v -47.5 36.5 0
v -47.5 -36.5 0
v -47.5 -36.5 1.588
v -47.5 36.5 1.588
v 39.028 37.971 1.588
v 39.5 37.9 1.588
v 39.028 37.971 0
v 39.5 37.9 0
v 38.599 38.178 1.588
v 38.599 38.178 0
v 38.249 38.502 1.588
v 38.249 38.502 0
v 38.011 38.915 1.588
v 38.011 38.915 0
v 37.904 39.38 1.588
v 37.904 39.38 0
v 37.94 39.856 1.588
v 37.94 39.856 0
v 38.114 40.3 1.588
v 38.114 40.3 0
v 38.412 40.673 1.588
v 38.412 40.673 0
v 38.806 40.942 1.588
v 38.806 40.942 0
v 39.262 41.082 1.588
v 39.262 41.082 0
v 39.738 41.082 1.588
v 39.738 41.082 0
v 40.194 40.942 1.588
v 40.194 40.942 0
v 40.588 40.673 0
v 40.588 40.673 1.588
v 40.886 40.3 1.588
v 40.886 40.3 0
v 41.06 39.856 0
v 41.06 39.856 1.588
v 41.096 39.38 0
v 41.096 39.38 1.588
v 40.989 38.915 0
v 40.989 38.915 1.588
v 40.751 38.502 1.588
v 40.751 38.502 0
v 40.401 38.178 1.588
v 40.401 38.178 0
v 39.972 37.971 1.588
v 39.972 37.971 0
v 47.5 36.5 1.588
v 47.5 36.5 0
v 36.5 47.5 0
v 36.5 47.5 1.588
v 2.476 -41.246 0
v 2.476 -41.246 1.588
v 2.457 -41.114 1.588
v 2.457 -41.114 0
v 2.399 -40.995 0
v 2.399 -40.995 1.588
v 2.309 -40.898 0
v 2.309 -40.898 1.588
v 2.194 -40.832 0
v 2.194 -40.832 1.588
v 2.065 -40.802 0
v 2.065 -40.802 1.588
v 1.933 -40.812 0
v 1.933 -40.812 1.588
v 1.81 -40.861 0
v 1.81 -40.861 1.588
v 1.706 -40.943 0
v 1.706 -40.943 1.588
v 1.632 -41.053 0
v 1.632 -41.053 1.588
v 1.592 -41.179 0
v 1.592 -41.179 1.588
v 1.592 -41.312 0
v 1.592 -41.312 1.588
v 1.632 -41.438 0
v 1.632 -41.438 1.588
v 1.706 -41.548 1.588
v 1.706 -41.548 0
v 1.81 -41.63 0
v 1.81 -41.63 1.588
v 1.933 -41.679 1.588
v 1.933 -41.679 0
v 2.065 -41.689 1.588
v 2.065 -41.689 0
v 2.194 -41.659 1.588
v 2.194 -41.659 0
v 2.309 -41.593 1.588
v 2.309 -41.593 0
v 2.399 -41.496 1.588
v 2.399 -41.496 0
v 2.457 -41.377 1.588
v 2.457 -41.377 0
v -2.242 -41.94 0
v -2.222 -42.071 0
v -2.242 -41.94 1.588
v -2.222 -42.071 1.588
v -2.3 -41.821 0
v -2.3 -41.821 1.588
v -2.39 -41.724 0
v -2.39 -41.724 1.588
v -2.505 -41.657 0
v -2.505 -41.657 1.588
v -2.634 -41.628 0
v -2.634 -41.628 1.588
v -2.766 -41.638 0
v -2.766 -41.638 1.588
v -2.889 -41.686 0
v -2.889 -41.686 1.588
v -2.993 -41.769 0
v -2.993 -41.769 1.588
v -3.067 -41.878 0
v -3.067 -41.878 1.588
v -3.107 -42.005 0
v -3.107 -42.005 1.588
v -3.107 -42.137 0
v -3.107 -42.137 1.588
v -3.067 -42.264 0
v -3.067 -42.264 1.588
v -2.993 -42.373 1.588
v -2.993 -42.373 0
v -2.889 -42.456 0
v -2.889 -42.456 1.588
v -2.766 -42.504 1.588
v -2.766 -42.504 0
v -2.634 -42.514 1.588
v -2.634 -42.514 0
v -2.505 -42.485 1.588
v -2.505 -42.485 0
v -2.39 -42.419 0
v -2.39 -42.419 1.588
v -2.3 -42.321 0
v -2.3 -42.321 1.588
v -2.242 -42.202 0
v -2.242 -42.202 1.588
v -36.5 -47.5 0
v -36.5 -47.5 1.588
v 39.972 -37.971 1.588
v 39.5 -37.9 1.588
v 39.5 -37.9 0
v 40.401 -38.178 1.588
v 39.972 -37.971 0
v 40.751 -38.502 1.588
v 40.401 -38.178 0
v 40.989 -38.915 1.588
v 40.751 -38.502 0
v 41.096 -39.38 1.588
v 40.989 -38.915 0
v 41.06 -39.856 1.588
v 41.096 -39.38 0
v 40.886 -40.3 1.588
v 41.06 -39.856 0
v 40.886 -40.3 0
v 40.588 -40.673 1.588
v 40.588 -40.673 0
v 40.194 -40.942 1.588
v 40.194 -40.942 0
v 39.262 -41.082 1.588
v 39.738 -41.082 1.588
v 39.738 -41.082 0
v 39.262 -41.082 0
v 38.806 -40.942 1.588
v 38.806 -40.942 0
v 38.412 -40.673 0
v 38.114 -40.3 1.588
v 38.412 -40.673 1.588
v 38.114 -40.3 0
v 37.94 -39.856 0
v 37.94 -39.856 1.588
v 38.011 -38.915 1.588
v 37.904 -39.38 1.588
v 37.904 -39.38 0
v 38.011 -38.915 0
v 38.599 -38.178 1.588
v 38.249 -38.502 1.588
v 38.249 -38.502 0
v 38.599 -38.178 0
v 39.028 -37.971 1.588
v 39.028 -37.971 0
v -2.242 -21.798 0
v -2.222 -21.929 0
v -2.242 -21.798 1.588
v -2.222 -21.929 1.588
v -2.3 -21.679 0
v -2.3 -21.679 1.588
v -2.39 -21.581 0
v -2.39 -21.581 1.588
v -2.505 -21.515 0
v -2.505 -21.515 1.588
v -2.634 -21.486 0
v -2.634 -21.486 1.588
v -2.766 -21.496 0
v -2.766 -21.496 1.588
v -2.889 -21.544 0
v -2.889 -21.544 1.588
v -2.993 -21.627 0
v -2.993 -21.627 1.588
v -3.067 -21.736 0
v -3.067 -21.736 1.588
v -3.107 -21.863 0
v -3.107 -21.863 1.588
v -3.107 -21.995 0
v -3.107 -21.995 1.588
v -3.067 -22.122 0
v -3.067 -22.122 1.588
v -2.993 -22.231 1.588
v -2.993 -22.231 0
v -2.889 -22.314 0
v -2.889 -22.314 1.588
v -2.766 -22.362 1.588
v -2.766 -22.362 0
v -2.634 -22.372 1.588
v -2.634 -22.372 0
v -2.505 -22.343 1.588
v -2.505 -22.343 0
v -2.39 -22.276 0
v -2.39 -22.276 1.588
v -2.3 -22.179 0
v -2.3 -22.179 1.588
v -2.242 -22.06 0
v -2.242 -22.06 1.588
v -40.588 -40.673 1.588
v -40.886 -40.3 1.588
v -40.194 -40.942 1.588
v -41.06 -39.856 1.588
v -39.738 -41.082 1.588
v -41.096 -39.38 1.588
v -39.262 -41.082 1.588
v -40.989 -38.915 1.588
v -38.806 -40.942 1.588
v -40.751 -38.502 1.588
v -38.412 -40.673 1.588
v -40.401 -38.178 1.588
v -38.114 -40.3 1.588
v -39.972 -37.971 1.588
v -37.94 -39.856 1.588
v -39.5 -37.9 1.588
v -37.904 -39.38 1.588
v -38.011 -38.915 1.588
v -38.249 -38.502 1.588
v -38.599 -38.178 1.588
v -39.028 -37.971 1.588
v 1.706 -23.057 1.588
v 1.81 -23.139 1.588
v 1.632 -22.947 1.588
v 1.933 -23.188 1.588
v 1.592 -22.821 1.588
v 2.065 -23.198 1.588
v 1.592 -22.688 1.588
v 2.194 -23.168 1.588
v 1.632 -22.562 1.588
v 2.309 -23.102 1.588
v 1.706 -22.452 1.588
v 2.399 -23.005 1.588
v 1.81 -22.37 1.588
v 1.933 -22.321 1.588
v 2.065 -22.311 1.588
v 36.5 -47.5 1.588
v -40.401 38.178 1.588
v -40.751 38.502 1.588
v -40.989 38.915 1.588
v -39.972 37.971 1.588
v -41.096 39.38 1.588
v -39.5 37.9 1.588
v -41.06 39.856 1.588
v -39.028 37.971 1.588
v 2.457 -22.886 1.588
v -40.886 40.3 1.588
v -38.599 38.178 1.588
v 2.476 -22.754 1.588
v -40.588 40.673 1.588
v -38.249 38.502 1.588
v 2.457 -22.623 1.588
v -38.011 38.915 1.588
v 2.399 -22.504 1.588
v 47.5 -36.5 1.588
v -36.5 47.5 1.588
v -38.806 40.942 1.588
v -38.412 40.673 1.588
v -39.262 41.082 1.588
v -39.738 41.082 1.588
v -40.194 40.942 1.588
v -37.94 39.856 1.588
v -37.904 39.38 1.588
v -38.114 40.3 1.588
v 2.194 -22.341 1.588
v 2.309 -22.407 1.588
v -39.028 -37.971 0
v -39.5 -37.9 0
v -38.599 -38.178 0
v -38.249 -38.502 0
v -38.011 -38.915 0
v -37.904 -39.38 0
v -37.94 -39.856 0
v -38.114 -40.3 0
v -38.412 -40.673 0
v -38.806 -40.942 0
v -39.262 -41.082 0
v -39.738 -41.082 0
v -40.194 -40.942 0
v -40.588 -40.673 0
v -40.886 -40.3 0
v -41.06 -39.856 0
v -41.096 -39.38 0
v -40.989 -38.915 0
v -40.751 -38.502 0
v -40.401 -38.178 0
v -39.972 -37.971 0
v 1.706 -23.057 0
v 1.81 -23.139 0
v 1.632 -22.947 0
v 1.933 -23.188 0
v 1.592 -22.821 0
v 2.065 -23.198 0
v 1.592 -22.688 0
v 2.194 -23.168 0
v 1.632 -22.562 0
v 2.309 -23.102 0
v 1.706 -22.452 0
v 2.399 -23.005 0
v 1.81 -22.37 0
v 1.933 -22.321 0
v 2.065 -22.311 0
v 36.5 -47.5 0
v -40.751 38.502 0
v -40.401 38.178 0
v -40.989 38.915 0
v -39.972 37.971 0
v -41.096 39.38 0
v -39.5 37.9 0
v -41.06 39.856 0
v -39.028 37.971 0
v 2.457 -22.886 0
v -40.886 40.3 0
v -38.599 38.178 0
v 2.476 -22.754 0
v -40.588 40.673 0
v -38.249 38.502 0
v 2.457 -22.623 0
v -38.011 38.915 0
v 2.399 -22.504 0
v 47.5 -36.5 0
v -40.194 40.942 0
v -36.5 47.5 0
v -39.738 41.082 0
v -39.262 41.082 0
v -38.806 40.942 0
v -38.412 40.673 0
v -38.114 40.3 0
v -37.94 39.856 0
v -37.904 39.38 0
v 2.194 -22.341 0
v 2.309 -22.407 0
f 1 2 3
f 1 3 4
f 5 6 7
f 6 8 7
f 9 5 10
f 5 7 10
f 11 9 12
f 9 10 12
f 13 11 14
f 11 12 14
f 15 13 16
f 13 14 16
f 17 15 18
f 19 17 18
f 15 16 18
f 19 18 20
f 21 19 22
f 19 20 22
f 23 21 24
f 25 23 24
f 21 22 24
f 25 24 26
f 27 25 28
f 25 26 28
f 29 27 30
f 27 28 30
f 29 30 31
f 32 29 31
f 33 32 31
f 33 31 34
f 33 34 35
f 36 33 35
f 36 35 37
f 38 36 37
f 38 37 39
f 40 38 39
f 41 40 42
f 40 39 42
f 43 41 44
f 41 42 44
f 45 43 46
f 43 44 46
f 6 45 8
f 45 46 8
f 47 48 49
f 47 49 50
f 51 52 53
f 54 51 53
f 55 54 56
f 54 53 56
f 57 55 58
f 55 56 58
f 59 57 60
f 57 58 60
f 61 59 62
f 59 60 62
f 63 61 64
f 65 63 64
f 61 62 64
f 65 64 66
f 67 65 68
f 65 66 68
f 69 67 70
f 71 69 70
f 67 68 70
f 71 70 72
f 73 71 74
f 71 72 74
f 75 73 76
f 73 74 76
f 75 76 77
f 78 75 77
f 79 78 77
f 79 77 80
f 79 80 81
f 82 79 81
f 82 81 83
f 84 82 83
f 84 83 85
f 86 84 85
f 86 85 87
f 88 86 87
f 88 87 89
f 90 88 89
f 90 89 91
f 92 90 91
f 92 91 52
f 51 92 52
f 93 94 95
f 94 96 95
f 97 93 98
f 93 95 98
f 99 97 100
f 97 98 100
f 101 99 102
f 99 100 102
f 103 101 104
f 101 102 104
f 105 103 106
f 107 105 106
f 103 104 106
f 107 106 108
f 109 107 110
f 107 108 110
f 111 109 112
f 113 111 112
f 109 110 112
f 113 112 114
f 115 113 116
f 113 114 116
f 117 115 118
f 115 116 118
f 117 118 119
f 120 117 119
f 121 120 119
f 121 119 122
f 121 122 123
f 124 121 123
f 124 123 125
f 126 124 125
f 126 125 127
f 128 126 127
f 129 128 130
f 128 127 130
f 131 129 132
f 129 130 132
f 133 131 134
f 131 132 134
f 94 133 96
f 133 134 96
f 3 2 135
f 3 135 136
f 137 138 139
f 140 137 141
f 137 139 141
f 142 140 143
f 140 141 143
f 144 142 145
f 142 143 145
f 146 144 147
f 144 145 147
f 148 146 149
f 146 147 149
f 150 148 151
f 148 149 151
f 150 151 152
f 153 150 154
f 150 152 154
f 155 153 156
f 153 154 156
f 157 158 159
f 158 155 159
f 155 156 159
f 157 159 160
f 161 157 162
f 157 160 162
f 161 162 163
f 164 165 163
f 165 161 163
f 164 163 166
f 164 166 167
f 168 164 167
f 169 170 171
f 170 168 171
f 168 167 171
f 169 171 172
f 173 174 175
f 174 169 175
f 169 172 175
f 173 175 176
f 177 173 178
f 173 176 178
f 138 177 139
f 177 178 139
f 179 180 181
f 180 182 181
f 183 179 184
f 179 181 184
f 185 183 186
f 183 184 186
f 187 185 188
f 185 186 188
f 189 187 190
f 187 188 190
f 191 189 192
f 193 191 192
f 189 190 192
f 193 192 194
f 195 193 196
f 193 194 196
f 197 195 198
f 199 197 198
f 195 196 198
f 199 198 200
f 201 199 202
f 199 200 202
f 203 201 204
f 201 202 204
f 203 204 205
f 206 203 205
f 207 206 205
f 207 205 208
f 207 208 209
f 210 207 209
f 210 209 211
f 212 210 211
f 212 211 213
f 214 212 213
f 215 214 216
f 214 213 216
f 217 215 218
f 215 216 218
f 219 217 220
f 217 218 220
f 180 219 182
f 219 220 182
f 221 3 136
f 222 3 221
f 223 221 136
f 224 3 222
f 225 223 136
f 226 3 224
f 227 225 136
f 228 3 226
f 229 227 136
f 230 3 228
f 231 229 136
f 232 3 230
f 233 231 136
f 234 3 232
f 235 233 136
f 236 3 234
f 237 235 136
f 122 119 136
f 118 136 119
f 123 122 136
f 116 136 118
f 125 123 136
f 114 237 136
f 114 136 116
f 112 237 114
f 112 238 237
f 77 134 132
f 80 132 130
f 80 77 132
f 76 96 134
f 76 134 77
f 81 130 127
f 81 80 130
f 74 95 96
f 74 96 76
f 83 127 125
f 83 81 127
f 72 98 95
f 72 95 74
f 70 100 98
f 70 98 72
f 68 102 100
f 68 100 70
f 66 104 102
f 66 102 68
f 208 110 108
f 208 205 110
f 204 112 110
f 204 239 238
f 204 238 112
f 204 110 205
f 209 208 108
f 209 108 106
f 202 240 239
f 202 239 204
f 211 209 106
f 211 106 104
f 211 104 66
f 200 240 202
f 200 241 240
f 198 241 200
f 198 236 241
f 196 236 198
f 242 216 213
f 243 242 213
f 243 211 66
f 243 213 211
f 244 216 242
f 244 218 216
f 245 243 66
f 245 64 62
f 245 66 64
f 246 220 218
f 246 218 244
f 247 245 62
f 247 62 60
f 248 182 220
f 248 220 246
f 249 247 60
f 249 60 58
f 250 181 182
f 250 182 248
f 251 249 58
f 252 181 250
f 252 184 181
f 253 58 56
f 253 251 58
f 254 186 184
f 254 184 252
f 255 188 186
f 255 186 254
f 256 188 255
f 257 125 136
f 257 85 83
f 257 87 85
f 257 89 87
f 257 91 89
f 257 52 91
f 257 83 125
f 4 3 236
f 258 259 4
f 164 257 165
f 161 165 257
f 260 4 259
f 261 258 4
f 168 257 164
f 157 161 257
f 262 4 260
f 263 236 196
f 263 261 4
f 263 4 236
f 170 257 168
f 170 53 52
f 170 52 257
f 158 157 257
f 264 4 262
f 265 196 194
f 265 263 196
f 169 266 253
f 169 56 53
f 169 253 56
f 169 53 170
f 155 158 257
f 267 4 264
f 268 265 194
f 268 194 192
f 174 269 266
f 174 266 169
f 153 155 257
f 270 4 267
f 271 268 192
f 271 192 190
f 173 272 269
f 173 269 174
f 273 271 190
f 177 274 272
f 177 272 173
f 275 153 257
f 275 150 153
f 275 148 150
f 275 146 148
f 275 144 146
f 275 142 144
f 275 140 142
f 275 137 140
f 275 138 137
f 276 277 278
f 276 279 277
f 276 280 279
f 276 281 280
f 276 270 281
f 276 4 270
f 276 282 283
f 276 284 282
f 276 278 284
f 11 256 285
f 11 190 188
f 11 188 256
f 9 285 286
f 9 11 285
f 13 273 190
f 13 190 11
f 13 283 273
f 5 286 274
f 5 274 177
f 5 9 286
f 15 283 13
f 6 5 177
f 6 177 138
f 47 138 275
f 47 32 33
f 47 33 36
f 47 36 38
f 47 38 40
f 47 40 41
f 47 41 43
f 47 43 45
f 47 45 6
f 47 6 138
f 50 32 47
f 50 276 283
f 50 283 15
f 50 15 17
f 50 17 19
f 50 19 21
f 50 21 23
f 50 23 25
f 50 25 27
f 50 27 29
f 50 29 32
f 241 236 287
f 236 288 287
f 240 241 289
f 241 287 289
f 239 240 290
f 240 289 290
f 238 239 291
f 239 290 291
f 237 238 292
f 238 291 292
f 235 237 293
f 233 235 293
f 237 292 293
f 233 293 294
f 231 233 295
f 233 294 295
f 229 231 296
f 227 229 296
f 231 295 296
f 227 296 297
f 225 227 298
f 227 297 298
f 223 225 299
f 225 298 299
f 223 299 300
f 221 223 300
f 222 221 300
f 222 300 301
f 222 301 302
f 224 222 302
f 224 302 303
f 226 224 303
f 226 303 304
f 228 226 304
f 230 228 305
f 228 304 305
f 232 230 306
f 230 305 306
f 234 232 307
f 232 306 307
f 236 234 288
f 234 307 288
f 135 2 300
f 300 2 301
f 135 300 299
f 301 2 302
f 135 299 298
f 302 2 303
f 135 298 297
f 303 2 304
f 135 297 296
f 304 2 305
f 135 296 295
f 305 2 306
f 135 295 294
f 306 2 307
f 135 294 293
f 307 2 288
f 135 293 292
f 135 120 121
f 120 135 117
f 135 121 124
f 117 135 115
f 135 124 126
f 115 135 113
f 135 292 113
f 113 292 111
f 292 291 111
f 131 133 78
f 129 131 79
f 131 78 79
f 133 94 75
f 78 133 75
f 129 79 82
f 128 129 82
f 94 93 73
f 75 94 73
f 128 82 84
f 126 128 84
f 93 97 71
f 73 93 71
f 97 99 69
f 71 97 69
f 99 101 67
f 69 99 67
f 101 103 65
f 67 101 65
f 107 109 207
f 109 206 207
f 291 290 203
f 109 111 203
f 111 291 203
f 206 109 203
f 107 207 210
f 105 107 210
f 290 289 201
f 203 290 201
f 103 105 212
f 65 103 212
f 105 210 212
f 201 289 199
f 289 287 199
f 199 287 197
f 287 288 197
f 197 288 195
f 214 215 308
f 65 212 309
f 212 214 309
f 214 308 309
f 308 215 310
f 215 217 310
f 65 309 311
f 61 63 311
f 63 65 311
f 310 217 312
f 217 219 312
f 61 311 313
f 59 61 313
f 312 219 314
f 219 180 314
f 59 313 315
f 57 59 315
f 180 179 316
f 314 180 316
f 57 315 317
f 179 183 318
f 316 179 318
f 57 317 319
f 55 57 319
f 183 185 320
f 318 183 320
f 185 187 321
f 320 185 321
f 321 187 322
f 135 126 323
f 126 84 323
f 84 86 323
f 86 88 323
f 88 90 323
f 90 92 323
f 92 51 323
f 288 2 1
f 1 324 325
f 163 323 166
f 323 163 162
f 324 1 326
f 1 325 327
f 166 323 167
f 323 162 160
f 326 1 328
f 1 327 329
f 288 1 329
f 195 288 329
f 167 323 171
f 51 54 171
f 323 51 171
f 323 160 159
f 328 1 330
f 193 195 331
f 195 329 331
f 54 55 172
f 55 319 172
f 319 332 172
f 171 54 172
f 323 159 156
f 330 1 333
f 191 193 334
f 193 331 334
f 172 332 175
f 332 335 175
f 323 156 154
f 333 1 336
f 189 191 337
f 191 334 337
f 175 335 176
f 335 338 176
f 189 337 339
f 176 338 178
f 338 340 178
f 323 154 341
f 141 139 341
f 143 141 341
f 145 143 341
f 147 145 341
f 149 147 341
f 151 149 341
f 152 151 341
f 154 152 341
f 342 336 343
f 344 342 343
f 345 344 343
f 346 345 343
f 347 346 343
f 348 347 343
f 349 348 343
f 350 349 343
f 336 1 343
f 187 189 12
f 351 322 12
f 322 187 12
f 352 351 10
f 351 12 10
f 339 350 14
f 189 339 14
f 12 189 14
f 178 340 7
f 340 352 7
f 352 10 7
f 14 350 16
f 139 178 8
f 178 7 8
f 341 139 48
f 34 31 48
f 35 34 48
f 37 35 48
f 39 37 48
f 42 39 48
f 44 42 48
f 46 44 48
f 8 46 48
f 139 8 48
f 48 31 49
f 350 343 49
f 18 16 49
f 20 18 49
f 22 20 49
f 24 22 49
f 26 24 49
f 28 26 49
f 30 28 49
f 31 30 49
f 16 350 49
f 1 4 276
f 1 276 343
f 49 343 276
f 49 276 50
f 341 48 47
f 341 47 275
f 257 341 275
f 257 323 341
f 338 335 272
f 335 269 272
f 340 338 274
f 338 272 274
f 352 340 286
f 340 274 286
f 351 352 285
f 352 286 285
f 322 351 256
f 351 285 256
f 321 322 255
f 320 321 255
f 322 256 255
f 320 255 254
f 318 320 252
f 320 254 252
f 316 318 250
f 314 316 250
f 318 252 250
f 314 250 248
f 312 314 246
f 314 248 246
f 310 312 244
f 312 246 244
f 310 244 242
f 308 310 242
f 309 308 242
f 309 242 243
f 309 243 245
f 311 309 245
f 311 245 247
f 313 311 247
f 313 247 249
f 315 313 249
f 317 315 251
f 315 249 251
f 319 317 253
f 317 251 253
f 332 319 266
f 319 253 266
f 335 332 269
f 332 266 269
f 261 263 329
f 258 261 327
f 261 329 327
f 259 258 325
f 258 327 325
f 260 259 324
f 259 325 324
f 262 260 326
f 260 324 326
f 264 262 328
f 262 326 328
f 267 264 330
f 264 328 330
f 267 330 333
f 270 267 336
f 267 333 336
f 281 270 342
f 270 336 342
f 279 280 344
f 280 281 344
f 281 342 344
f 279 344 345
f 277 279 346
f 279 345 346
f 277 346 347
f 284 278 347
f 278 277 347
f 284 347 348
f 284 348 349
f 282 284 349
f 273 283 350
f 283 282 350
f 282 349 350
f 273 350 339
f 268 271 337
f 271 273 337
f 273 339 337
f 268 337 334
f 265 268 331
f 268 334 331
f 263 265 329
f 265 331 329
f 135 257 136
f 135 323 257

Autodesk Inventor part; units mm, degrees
sketch "AL_spacer_contact_Zminus" plane through (0, 0, 0) normal (0, 0, 1) x (1, 0, 0)
  circle A0 centre (39.5, 39.5) radius 3.175
  circle A1 centre (39.5, -39.5) radius 3.175
  circle A2 centre (-39.5, -39.5) radius 3.175
  circle A3 centre (-39.5, 39.5) radius 3.175
  point P0 (0, 0)
  dimension "d228" = 39.5
  dimension "d229" = 39.5
  dimension "d230" = 39.5
  dimension "d231" = 39.5
  dimension "d232" = 39.5
  dimension "d233" = 39.5
  dimension "d234" = 39.5
  dimension "d235" = 39.5
  dimension "d236" = 6.35
sketch "Delrin_stayout_Zminus" plane through (0, 0, 0) normal (0, 0, 1) x (1, 0, 0)
  line L0 (47.5, 39.5) -> (47.5, 31)
  line L1 (47.5, 31) -> (39.5, 31)
  line L2 (39.5, 31) -> (31, 39.5)
  line L3 (31, 39.5) -> (31, 47.5)
  line L4 (31, 47.5) -> (39.5, 47.5)
  line L5 (39.5, 47.5) -> (47.5, 39.5)
  line L6 (-39.5, 47.5) -> (-47.5, 39.5)
  line L7 (-47.5, 39.5) -> (-47.5, 31)
  line L8 (-47.5, 31) -> (-39.5, 31)
  line L9 (-39.5, 31) -> (-31, 39.5)
  line L10 (-31, 39.5) -> (-31, 47.5)
  line L11 (-31, 47.5) -> (-39.5, 47.5)
  line L12 (47.5, -39.5) -> (39.5, -47.5)
  line L13 (39.5, -47.5) -> (31, -47.5)
  line L14 (31, -47.5) -> (31, -39.5)
  line L15 (31, -39.5) -> (39.5, -31)
  line L16 (39.5, -31) -> (47.5, -31)
  line L17 (47.5, -31) -> (47.5, -39.5)
  line L18 (-39.5, -47.5) -> (-47.5, -39.5)
  line L19 (-47.5, -39.5) -> (-47.5, -31)
  line L20 (-47.5, -31) -> (-39.5, -31)
  line L21 (-39.5, -31) -> (-31, -39.5)
  line L22 (-31, -39.5) -> (-31, -47.5)
  line L23 (-31, -47.5) -> (-39.5, -47.5)
  point P0 (0, 0)
  dimension "d243" = 16.5
  dimension "d244" = 8
  dimension "d245" = 8.5
  dimension "d246" = 16.5
  dimension "d247" = 47.5
  dimension "d248" = 47.5
  dimension "d249" = 47.5
  dimension "d250" = 47.5
  dimension "d251" = 47.5
  dimension "d252" = 47.5
  dimension "d253" = 47.5
  dimension "d254" = 47.5
sketch "Nub_stayout_Zminus" plane through (0, 0, 0) normal (0, 0, 1) x (1, 0, 0)
  line L0 (29, 47.5) -> (39.5, 47.5)
  line L1 (39.5, 47.5) -> (47.5, 39.5)
  line L2 (47.5, 39.5) -> (47.5, 29)
  line L3 (47.5, 29) -> (42, 29)
  line L4 (42, 29) -> (42, 40.4125)
  line L5 (40.4125, 42) -> (29, 42)
  line L6 (29, 42) -> (29, 47.5)
  arc A0 (42, 40.4125) -> (40.4125, 42) centre (40.4125, 40.4125) ccw
  line L7 (-29, 47.5) -> (-39.5, 47.5)
  line L8 (-39.5, 47.5) -> (-47.5, 39.5)
  line L9 (-47.5, 39.5) -> (-47.5, 29)
  line L10 (-47.5, 29) -> (-42, 29)
  line L11 (-42, 29) -> (-42, 40.4125)
  line L12 (-40.4125, 42) -> (-29, 42)
  line L13 (-29, 42) -> (-29, 47.5)
  arc A1 (-40.4125, 42) -> (-42, 40.4125) centre (-40.4125, 40.4125) ccw
  line L14 (-47.5, -29) -> (-42, -29)
  line L15 (-42, -29) -> (-42, -40.4125)
  line L16 (-40.4125, -42) -> (-29, -42)
  line L17 (-29, -42) -> (-29, -47.5)
  line L18 (-29, -47.5) -> (-39.5, -47.5)
  line L19 (-39.5, -47.5) -> (-47.5, -39.5)
  line L20 (-47.5, -39.5) -> (-47.5, -29)
  arc A2 (-42, -40.4125) -> (-40.4125, -42) centre (-40.4125, -40.4125) ccw
  line L21 (47.5, -29) -> (42, -29)
  line L22 (42, -29) -> (42, -40.4125)
  line L23 (40.4125, -42) -> (29, -42)
  line L24 (29, -42) -> (29, -47.5)
  line L25 (29, -47.5) -> (39.5, -47.5)
  line L26 (39.5, -47.5) -> (47.5, -39.5)
  line L27 (47.5, -39.5) -> (47.5, -29)
  arc A3 (40.4125, -42) -> (42, -40.4125) centre (40.4125, -40.4125) ccw
  point P0 (0, 0)
  dimension "d255" = 1.5875
  dimension "d256" = 18.5
  dimension "d257" = 8
  dimension "d258" = 5.5
  dimension "d259" = 47.5
  dimension "d260" = 47.5
  dimension "d264" = 1.5875
  dimension "d265" = 47.5
  dimension "d266" = 47.5
  dimension "d267" = 1.5875
  dimension "d268" = 47.5
  dimension "d269" = 47.5
  dimension "d270" = 1.5875
  dimension "d271" = 47.5
  dimension "d272" = 47.5
ref_plane "Zplus_face" through (0, 0, 1.5875) normal (0, 0, 1) x (1, 0, 0)
sketch "AL_spacer_contact_Zplus" plane through (0, 0, 1.5875) normal (0, 0, 1) x (1, 0, 0)
  circle A0 centre (-39.5, 39.5) radius 3.175
  circle A1 centre (-39.5, -39.5) radius 3.175
  circle A2 centre (39.5, -39.5) radius 3.175
  circle A3 centre (39.5, 39.5) radius 3.175
  point P0 (0, 0)
  dimension "d129" = 39.5
  dimension "d130" = 39.5
  dimension "d131" = 39.5
  dimension "d132" = 39.5
  dimension "d133" = 6.35
sketch "Delrin_stayout_Zplus" plane through (0, 0, 1.5875) normal (0, 0, 1) x (1, 0, 0)
  line L0 (47.5, -31) -> (47.5, -39.5)
  line L1 (47.5, -39.5) -> (39.5, -47.5)
  line L2 (39.5, -47.5) -> (31, -47.5)
  line L3 (31, -47.5) -> (31, -39.5)
  line L4 (31, -39.5) -> (39.5, -31)
  line L5 (39.5, -31) -> (47.5, -31)
  line L6 (47.5, 31) -> (47.5, 39.5)
  line L7 (47.5, 39.5) -> (39.5, 47.5)
  line L8 (39.5, 47.5) -> (31, 47.5)
  line L9 (31, 47.5) -> (31, 39.5)
  line L10 (31, 39.5) -> (39.5, 31)
  line L11 (39.5, 31) -> (47.5, 31)
  line L12 (-39.5, 47.5) -> (-47.5, 39.5)
  line L13 (-47.5, 39.5) -> (-47.5, 31)
  line L14 (-47.5, 31) -> (-39.5, 31)
  line L15 (-39.5, 31) -> (-31, 39.5)
  line L16 (-31, 39.5) -> (-31, 47.5)
  line L17 (-31, 47.5) -> (-39.5, 47.5)
  line L18 (-47.5, -39.5) -> (-39.5, -47.5)
  line L19 (-39.5, -47.5) -> (-31, -47.5)
  line L20 (-31, -47.5) -> (-31, -39.5)
  line L21 (-31, -39.5) -> (-39.5, -31)
  line L22 (-39.5, -31) -> (-47.5, -31)
  line L23 (-47.5, -31) -> (-47.5, -39.5)
  point P0 (0, 0)
  dimension "d115" = 16.5
  dimension "d116" = 16.5
  dimension "d117" = 8
  dimension "d118" = 8.5
  dimension "d121" = 47.5
  dimension "d122" = 47.5
  dimension "d123" = 47.5
  dimension "d124" = 47.5
  dimension "d125" = 47.5
  dimension "d126" = 47.5
  dimension "d127" = 47.5
  dimension "d128" = 47.5
sketch "Nub_stayout_Zplus" plane through (0, 0, 1.5875) normal (0, 0, 1) x (1, 0, 0)
  line L0 (47.5, 29) -> (42, 29)
  line L1 (42, 29) -> (42, 40.4125)
  line L2 (40.4125, 42) -> (29, 42)
  line L3 (29, 42) -> (29, 47.5)
  arc A0 (42, 40.4125) -> (40.4125, 42) centre (40.4125, 40.4125) ccw
  line L4 (29, 47.5) -> (39.5, 47.5)
  line L5 (39.5, 47.5) -> (47.5, 39.5)
  line L6 (47.5, 39.5) -> (47.5, 29)
  line L7 (-39.5, 47.5) -> (-29, 47.5)
  line L8 (-29, 47.5) -> (-29, 42)
  line L9 (-29, 42) -> (-40.4125, 42)
  line L10 (-42, 40.4125) -> (-42, 29)
  line L11 (-42, 29) -> (-47.5, 29)
  line L12 (-47.5, 29) -> (-47.5, 39.5)
  line L13 (-47.5, 39.5) -> (-39.5, 47.5)
  arc A1 (-40.4125, 42) -> (-42, 40.4125) centre (-40.4125, 40.4125) ccw
  line L14 (-47.5, -29) -> (-47.5, -39.5)
  line L15 (-47.5, -39.5) -> (-39.5, -47.5)
  line L16 (-39.5, -47.5) -> (-29, -47.5)
  line L17 (-29, -47.5) -> (-29, -42)
  line L18 (-29, -42) -> (-40.4125, -42)
  line L19 (-42, -40.4125) -> (-42, -29)
  line L20 (-42, -29) -> (-47.5, -29)
  arc A2 (-42, -40.4125) -> (-40.4125, -42) centre (-40.4125, -40.4125) ccw
  line L21 (29, -47.5) -> (39.5, -47.5)
  line L22 (39.5, -47.5) -> (47.5, -39.5)
  line L23 (47.5, -39.5) -> (47.5, -29)
  line L24 (47.5, -29) -> (42, -29)
  line L25 (42, -29) -> (42, -40.4125)
  line L26 (40.4125, -42) -> (29, -42)
  line L27 (29, -42) -> (29, -47.5)
  arc A3 (40.4125, -42) -> (42, -40.4125) centre (40.4125, -40.4125) ccw
  point P0 (0, 0)
  dimension "d116" = 16.5
  dimension "d146" = 1.5875
  dimension "d147" = 5.5
  dimension "d149" = 18.5
  dimension "d150" = 8
  dimension "d151" = 47.5
  dimension "d152" = 47.5
  dimension "d153" = 1.5875
  dimension "d154" = 47.5
  dimension "d155" = 47.5
  dimension "d156" = 1.5875
  dimension "d157" = 47.5
  dimension "d158" = 47.5
  dimension "d159" = 1.5875
  dimension "d160" = 47.5
  dimension "d161" = 47.5
sketch "Sketch1" plane through (0, 0, 0) normal (0, 0, 1) x (1, 0, 0)
  line L0 (-47.5, 47.5) -> (47.5, 47.5)
  line L1 (47.5, 47.5) -> (47.5, -47.5)
  line L2 (47.5, -47.5) -> (-47.5, -47.5)
  line L3 (-47.5, -47.5) -> (-47.5, 47.5)
  point P0 (0, 0)
  dimension "d0" = 95
  dimension "d1" = 95
  dimension "d2" = 47.5
  dimension "d3" = 47.5
extrude "Extrusion1" add sketch "Sketch1" along normal blind 1.5875
chamfer "Chamfer2" distance 11 angle 45 4 edges at (-47.5, -47.5, 0.7937) (47.5, -47.5, 0.7937) (47.5, 47.5, 0.7937) (-47.5, 47.5, 0.7937)
ref_plane "Work Plane_ConnX" through (-32, 0, 0) normal (1, 0, 0) x (0, 1, 0)
ref_plane "Work Plane_ConnY" through (0, 0, 0) normal (0, 1, 0) x (-1, 0, 0)
sketch "Sketch9" plane through (0, 0, 1.5875) normal (0, 0, 1) x (1, 0, 0)
  line L0 (47.5, 47.5) -> (47.5, -47.5) projected
  line L1 (58.5598, -32) -> (-58.5598, -32)
  circle A0 centre (-2.667, -21.9289) radius 0.4445
  circle A1 centre (-2.667, -42.0711) radius 0.4445
  line L2 (0, 26.5598) -> (0, -90.5598) construction
  point P0 (0, 0)
  point P1 (0, -32)
  dimension "d134" = 20.1422
  dimension "d136" = 2.667
  dimension "d138" = 0.889
  dimension "d141" = 180
  dimension "d350" = 32
  dimension "d351" = 0
extrude "Holes_Conn_Zminus" cut sketch "Sketch9" against normal through all
sketch "Sketch22" plane through (0, 0, 1.5875) normal (0, 0, 1) x (1, 0, 0)
  line L0 (47.5, 36.5) -> (47.5, -36.5) projected
  line L1 (0, -1.0026) -> (0, -62.9974) construction
  line L2 (62.8115, -32) -> (-62.8115, -32)
  circle A0 centre (2.032, -22.7545) radius 0.4445
  circle A1 centre (2.032, -41.2455) radius 0.4445
  point P0 (0, 0)
  point P1 (0, -32)
  dimension "d282" = 180
  dimension "d283" = 18.491
  dimension "d284" = 0.889
  dimension "d285" = 2.032
  dimension "d352" = 32
  dimension "d353" = 0
extrude "Holes_Conn_Zplus" cut sketch "Sketch22" against normal through all
hole "Hole5" at (39.5, 39.5, 1.5875) direction (0, 0, -1) diameter 3.2 end through all
mirror "Mirror5" about plane through (0, 0, 0) normal (1, 0, 0) of "Hole5"
mirror "Mirror6" about plane through (0, 0, 0) normal (0, 1, 0) of "Hole5", "Mirror5"
sketch "Sketch25" plane through (0, 0, 1.5875) normal (0, 0, 1) x (1, 0, 0)
  circle A0 centre (-39.5, -39.5) radius 1.6 projected
  circle A1 centre (39.5, -39.5) radius 1.6 projected
  circle A2 centre (-39.5, 39.5) radius 1.6 projected
  circle A3 centre (39.5, 39.5) radius 1.6 projected
  line L0 (36.5, -47.5) -> (-36.5, -47.5) projected
  line L1 (0, 0) -> (0, -59.2198)
  line L2 (8, -47.5) -> (8, -15.5)
  line L3 (8, -15.5) -> (-8, -15.5)
  line L4 (-8, -15.5) -> (-8, -47.5)
  line L5 (-8, -47.5) -> (-62.7516, -61.7336)
  line L6 (-62.7516, -61.7336) -> (-64.2933, 68.2222)
  line L7 (-64.2933, 68.2222) -> (58.3572, 62.5728)
  line L8 (58.3572, 62.5728) -> (56.5848, -69.017)
  line L9 (56.5848, -69.017) -> (8, -47.5)
  dimension "d362" = 16
  dimension "d363" = 32
extrude "Extrusion9" [suppressed]
sketch "Sketch26" plane through (0, 0, 1.5875) normal (0, 0, 1) x (1, 0, 0)
  line L0 (-47.5, -36.5) -> (-47.5, 36.5) projected
  line L1 (36.5, -47.5) -> (-36.5, -47.5) projected
  line L2 (47.5, 36.5) -> (47.5, -36.5) projected
  line L3 (-36.5, 47.5) -> (36.5, 47.5) projected
  line L4 (-47.4469, 47.553) -> (47.5, 47.5) construction
  line L5 (47.5, 47.5) -> (47.4469, -47.553) construction
  line L6 (47.4469, -47.553) -> (-47.5, -47.5) construction
  line L7 (-47.5, -47.5) -> (-47.4469, 47.553) construction
  point P0 (0, 0)
decal "Decal1"
sketch "Sketch27" plane through (0, 0, 0) normal (0, 0, -1) x (-1, 0, 0)
  line L0 (-47.5, 36.5) -> (-47.5, -36.5) projected
  line L1 (-36.5, -47.5) -> (36.5, -47.5) projected
  line L2 (47.5, -36.5) -> (47.5, 36.5) projected
  line L3 (-47.5, 47.5) -> (47.5, 47.5) construction
  line L4 (47.5, 47.5) -> (47.5, -47.5) construction
  line L5 (47.5, -47.5) -> (-47.5, -47.5) construction
  line L6 (-47.5, -47.5) -> (-47.5, 47.5) construction
  point P0 (0, 0)
decal "Decal2"
properties part number "PCB_VUC" material "FR4"
